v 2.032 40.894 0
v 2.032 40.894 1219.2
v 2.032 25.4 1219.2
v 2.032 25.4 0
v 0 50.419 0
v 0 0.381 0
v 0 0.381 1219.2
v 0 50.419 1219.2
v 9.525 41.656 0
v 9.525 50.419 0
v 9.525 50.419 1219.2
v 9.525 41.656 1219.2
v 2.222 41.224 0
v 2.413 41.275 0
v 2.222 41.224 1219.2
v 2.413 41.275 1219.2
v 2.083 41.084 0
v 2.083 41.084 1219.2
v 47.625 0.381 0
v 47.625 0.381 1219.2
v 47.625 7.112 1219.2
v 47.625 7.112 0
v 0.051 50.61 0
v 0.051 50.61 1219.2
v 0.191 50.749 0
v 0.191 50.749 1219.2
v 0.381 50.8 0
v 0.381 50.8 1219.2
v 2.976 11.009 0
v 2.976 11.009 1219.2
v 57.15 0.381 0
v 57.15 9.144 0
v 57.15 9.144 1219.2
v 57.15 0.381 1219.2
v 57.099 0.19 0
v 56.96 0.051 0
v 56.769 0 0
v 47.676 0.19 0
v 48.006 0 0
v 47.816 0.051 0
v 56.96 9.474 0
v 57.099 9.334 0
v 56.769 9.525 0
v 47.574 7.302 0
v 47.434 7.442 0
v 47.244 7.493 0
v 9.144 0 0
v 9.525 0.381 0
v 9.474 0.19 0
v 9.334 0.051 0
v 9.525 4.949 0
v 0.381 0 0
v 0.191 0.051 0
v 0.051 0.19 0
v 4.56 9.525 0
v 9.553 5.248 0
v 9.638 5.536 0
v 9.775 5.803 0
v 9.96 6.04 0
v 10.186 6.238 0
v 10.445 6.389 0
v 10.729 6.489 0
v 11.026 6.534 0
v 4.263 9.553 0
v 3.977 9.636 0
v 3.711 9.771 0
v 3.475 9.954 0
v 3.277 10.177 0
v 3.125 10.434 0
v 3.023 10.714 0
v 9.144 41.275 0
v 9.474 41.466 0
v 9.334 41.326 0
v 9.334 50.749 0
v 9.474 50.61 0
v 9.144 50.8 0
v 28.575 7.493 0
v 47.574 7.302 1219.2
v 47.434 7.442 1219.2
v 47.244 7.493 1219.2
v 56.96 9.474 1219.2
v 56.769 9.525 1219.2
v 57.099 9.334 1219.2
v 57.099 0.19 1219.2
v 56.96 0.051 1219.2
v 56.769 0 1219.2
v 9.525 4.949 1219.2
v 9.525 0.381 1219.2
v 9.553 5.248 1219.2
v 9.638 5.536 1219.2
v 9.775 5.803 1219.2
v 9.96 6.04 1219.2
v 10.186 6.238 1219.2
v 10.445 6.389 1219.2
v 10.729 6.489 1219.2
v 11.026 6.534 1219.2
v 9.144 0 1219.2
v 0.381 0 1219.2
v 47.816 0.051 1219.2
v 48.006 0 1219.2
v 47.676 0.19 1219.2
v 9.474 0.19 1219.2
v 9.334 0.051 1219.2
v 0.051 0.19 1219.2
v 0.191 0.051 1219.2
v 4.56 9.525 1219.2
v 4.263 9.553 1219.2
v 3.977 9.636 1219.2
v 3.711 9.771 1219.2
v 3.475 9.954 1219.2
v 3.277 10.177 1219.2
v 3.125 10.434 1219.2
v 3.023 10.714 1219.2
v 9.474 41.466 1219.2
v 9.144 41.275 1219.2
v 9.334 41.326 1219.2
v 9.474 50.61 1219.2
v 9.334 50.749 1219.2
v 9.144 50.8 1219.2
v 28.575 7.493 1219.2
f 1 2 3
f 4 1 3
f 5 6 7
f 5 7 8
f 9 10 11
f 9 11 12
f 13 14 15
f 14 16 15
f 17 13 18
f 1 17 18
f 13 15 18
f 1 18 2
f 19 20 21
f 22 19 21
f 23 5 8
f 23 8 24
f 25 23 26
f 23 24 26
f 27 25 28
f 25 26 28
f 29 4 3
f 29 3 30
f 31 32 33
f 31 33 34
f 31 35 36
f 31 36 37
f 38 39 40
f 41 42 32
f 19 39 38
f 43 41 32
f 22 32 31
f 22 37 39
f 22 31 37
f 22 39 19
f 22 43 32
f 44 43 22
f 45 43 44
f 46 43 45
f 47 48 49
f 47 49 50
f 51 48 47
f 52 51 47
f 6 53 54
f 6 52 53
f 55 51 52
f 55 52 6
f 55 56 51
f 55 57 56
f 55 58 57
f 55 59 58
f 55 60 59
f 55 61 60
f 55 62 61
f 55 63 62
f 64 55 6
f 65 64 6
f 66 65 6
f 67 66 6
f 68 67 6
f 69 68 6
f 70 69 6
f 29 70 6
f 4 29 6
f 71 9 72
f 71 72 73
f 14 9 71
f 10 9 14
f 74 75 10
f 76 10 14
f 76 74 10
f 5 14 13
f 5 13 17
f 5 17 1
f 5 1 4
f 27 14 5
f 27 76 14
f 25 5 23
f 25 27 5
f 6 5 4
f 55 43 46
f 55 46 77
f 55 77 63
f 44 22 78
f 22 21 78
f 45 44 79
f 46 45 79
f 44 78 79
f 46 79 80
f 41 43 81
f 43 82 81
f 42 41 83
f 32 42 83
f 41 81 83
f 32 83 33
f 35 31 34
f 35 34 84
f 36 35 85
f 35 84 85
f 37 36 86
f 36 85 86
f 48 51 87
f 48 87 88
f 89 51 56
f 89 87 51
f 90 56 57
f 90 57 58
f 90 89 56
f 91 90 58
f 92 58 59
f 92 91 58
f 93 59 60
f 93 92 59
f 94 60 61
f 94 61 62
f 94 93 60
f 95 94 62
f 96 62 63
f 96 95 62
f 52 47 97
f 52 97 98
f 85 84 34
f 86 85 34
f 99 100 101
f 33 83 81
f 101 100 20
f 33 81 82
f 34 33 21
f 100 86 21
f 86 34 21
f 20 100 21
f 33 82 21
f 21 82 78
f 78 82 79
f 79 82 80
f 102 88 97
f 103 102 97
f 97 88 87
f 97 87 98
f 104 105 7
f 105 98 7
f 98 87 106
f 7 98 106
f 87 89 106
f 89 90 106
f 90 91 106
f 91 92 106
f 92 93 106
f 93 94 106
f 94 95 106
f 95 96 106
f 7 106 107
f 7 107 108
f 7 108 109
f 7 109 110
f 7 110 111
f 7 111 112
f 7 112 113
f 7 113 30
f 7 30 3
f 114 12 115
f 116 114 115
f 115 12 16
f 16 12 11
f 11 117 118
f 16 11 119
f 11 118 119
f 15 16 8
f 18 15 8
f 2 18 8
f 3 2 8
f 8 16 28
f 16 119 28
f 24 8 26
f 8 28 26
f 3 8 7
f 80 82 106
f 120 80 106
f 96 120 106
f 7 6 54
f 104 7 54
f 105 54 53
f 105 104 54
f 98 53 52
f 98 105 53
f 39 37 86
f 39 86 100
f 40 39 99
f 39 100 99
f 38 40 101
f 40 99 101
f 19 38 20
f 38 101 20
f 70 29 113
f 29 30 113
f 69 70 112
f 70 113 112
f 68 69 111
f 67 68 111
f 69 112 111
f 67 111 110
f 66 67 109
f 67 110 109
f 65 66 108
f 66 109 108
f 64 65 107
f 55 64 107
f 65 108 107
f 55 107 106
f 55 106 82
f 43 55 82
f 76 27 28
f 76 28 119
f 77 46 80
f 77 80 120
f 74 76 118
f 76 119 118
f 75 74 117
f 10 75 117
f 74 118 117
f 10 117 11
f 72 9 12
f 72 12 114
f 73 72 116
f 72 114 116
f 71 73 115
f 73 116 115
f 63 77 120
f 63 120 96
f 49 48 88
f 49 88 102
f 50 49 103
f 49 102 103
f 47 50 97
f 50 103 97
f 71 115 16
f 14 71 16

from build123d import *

# Parameters (mm, degrees)
BOSS_EXTRUDE1_DEPTH = 1219.2
FILLET1_R           = 0.381
FILLET2_R           = 1.5875


with BuildPart() as part:
    # Sketch2 → Boss-Extrude1 (new body)
    with BuildSketch(Plane.XY):
        Polygon((0, 0), (0, 50.8), (9.525, 50.8), (9.525, 41.275), (2.032, 41.275), (2.032, 25.4), (3.0734, 9.525), (57.15, 9.525), (57.15, 0), (47.625, 0), (47.625, 7.493), (28.575, 7.493), (9.525, 6.4516), (9.525, 0), align=None)
    extrude(amount=BOSS_EXTRUDE1_DEPTH)

    # Fillet1
    fillet1_edges = [part.edges().sort_by_distance(p)[0] for p in [
        (0, 0, 609.6),
        (0, 50.8, 609.6),
        (9.525, 50.8, 609.6),
        (9.525, 41.275, 609.6),
        (2.032, 41.275, 609.6),
        (57.15, 9.525, 609.6),
        (57.15, 0, 609.6),
        (47.625, 0, 609.6),
        (47.625, 7.493, 609.6),
        (9.525, 0, 609.6),
    ]]
    fillet(fillet1_edges, radius=FILLET1_R)

    # Fillet2
    fillet2_edges = [part.edges().sort_by_distance(p)[0] for p in [
        (3.0734, 9.525, 609.6),
        (9.525, 6.4516, 609.6),
    ]]
    fillet(fillet2_edges, radius=FILLET2_R)


solid = part.part
